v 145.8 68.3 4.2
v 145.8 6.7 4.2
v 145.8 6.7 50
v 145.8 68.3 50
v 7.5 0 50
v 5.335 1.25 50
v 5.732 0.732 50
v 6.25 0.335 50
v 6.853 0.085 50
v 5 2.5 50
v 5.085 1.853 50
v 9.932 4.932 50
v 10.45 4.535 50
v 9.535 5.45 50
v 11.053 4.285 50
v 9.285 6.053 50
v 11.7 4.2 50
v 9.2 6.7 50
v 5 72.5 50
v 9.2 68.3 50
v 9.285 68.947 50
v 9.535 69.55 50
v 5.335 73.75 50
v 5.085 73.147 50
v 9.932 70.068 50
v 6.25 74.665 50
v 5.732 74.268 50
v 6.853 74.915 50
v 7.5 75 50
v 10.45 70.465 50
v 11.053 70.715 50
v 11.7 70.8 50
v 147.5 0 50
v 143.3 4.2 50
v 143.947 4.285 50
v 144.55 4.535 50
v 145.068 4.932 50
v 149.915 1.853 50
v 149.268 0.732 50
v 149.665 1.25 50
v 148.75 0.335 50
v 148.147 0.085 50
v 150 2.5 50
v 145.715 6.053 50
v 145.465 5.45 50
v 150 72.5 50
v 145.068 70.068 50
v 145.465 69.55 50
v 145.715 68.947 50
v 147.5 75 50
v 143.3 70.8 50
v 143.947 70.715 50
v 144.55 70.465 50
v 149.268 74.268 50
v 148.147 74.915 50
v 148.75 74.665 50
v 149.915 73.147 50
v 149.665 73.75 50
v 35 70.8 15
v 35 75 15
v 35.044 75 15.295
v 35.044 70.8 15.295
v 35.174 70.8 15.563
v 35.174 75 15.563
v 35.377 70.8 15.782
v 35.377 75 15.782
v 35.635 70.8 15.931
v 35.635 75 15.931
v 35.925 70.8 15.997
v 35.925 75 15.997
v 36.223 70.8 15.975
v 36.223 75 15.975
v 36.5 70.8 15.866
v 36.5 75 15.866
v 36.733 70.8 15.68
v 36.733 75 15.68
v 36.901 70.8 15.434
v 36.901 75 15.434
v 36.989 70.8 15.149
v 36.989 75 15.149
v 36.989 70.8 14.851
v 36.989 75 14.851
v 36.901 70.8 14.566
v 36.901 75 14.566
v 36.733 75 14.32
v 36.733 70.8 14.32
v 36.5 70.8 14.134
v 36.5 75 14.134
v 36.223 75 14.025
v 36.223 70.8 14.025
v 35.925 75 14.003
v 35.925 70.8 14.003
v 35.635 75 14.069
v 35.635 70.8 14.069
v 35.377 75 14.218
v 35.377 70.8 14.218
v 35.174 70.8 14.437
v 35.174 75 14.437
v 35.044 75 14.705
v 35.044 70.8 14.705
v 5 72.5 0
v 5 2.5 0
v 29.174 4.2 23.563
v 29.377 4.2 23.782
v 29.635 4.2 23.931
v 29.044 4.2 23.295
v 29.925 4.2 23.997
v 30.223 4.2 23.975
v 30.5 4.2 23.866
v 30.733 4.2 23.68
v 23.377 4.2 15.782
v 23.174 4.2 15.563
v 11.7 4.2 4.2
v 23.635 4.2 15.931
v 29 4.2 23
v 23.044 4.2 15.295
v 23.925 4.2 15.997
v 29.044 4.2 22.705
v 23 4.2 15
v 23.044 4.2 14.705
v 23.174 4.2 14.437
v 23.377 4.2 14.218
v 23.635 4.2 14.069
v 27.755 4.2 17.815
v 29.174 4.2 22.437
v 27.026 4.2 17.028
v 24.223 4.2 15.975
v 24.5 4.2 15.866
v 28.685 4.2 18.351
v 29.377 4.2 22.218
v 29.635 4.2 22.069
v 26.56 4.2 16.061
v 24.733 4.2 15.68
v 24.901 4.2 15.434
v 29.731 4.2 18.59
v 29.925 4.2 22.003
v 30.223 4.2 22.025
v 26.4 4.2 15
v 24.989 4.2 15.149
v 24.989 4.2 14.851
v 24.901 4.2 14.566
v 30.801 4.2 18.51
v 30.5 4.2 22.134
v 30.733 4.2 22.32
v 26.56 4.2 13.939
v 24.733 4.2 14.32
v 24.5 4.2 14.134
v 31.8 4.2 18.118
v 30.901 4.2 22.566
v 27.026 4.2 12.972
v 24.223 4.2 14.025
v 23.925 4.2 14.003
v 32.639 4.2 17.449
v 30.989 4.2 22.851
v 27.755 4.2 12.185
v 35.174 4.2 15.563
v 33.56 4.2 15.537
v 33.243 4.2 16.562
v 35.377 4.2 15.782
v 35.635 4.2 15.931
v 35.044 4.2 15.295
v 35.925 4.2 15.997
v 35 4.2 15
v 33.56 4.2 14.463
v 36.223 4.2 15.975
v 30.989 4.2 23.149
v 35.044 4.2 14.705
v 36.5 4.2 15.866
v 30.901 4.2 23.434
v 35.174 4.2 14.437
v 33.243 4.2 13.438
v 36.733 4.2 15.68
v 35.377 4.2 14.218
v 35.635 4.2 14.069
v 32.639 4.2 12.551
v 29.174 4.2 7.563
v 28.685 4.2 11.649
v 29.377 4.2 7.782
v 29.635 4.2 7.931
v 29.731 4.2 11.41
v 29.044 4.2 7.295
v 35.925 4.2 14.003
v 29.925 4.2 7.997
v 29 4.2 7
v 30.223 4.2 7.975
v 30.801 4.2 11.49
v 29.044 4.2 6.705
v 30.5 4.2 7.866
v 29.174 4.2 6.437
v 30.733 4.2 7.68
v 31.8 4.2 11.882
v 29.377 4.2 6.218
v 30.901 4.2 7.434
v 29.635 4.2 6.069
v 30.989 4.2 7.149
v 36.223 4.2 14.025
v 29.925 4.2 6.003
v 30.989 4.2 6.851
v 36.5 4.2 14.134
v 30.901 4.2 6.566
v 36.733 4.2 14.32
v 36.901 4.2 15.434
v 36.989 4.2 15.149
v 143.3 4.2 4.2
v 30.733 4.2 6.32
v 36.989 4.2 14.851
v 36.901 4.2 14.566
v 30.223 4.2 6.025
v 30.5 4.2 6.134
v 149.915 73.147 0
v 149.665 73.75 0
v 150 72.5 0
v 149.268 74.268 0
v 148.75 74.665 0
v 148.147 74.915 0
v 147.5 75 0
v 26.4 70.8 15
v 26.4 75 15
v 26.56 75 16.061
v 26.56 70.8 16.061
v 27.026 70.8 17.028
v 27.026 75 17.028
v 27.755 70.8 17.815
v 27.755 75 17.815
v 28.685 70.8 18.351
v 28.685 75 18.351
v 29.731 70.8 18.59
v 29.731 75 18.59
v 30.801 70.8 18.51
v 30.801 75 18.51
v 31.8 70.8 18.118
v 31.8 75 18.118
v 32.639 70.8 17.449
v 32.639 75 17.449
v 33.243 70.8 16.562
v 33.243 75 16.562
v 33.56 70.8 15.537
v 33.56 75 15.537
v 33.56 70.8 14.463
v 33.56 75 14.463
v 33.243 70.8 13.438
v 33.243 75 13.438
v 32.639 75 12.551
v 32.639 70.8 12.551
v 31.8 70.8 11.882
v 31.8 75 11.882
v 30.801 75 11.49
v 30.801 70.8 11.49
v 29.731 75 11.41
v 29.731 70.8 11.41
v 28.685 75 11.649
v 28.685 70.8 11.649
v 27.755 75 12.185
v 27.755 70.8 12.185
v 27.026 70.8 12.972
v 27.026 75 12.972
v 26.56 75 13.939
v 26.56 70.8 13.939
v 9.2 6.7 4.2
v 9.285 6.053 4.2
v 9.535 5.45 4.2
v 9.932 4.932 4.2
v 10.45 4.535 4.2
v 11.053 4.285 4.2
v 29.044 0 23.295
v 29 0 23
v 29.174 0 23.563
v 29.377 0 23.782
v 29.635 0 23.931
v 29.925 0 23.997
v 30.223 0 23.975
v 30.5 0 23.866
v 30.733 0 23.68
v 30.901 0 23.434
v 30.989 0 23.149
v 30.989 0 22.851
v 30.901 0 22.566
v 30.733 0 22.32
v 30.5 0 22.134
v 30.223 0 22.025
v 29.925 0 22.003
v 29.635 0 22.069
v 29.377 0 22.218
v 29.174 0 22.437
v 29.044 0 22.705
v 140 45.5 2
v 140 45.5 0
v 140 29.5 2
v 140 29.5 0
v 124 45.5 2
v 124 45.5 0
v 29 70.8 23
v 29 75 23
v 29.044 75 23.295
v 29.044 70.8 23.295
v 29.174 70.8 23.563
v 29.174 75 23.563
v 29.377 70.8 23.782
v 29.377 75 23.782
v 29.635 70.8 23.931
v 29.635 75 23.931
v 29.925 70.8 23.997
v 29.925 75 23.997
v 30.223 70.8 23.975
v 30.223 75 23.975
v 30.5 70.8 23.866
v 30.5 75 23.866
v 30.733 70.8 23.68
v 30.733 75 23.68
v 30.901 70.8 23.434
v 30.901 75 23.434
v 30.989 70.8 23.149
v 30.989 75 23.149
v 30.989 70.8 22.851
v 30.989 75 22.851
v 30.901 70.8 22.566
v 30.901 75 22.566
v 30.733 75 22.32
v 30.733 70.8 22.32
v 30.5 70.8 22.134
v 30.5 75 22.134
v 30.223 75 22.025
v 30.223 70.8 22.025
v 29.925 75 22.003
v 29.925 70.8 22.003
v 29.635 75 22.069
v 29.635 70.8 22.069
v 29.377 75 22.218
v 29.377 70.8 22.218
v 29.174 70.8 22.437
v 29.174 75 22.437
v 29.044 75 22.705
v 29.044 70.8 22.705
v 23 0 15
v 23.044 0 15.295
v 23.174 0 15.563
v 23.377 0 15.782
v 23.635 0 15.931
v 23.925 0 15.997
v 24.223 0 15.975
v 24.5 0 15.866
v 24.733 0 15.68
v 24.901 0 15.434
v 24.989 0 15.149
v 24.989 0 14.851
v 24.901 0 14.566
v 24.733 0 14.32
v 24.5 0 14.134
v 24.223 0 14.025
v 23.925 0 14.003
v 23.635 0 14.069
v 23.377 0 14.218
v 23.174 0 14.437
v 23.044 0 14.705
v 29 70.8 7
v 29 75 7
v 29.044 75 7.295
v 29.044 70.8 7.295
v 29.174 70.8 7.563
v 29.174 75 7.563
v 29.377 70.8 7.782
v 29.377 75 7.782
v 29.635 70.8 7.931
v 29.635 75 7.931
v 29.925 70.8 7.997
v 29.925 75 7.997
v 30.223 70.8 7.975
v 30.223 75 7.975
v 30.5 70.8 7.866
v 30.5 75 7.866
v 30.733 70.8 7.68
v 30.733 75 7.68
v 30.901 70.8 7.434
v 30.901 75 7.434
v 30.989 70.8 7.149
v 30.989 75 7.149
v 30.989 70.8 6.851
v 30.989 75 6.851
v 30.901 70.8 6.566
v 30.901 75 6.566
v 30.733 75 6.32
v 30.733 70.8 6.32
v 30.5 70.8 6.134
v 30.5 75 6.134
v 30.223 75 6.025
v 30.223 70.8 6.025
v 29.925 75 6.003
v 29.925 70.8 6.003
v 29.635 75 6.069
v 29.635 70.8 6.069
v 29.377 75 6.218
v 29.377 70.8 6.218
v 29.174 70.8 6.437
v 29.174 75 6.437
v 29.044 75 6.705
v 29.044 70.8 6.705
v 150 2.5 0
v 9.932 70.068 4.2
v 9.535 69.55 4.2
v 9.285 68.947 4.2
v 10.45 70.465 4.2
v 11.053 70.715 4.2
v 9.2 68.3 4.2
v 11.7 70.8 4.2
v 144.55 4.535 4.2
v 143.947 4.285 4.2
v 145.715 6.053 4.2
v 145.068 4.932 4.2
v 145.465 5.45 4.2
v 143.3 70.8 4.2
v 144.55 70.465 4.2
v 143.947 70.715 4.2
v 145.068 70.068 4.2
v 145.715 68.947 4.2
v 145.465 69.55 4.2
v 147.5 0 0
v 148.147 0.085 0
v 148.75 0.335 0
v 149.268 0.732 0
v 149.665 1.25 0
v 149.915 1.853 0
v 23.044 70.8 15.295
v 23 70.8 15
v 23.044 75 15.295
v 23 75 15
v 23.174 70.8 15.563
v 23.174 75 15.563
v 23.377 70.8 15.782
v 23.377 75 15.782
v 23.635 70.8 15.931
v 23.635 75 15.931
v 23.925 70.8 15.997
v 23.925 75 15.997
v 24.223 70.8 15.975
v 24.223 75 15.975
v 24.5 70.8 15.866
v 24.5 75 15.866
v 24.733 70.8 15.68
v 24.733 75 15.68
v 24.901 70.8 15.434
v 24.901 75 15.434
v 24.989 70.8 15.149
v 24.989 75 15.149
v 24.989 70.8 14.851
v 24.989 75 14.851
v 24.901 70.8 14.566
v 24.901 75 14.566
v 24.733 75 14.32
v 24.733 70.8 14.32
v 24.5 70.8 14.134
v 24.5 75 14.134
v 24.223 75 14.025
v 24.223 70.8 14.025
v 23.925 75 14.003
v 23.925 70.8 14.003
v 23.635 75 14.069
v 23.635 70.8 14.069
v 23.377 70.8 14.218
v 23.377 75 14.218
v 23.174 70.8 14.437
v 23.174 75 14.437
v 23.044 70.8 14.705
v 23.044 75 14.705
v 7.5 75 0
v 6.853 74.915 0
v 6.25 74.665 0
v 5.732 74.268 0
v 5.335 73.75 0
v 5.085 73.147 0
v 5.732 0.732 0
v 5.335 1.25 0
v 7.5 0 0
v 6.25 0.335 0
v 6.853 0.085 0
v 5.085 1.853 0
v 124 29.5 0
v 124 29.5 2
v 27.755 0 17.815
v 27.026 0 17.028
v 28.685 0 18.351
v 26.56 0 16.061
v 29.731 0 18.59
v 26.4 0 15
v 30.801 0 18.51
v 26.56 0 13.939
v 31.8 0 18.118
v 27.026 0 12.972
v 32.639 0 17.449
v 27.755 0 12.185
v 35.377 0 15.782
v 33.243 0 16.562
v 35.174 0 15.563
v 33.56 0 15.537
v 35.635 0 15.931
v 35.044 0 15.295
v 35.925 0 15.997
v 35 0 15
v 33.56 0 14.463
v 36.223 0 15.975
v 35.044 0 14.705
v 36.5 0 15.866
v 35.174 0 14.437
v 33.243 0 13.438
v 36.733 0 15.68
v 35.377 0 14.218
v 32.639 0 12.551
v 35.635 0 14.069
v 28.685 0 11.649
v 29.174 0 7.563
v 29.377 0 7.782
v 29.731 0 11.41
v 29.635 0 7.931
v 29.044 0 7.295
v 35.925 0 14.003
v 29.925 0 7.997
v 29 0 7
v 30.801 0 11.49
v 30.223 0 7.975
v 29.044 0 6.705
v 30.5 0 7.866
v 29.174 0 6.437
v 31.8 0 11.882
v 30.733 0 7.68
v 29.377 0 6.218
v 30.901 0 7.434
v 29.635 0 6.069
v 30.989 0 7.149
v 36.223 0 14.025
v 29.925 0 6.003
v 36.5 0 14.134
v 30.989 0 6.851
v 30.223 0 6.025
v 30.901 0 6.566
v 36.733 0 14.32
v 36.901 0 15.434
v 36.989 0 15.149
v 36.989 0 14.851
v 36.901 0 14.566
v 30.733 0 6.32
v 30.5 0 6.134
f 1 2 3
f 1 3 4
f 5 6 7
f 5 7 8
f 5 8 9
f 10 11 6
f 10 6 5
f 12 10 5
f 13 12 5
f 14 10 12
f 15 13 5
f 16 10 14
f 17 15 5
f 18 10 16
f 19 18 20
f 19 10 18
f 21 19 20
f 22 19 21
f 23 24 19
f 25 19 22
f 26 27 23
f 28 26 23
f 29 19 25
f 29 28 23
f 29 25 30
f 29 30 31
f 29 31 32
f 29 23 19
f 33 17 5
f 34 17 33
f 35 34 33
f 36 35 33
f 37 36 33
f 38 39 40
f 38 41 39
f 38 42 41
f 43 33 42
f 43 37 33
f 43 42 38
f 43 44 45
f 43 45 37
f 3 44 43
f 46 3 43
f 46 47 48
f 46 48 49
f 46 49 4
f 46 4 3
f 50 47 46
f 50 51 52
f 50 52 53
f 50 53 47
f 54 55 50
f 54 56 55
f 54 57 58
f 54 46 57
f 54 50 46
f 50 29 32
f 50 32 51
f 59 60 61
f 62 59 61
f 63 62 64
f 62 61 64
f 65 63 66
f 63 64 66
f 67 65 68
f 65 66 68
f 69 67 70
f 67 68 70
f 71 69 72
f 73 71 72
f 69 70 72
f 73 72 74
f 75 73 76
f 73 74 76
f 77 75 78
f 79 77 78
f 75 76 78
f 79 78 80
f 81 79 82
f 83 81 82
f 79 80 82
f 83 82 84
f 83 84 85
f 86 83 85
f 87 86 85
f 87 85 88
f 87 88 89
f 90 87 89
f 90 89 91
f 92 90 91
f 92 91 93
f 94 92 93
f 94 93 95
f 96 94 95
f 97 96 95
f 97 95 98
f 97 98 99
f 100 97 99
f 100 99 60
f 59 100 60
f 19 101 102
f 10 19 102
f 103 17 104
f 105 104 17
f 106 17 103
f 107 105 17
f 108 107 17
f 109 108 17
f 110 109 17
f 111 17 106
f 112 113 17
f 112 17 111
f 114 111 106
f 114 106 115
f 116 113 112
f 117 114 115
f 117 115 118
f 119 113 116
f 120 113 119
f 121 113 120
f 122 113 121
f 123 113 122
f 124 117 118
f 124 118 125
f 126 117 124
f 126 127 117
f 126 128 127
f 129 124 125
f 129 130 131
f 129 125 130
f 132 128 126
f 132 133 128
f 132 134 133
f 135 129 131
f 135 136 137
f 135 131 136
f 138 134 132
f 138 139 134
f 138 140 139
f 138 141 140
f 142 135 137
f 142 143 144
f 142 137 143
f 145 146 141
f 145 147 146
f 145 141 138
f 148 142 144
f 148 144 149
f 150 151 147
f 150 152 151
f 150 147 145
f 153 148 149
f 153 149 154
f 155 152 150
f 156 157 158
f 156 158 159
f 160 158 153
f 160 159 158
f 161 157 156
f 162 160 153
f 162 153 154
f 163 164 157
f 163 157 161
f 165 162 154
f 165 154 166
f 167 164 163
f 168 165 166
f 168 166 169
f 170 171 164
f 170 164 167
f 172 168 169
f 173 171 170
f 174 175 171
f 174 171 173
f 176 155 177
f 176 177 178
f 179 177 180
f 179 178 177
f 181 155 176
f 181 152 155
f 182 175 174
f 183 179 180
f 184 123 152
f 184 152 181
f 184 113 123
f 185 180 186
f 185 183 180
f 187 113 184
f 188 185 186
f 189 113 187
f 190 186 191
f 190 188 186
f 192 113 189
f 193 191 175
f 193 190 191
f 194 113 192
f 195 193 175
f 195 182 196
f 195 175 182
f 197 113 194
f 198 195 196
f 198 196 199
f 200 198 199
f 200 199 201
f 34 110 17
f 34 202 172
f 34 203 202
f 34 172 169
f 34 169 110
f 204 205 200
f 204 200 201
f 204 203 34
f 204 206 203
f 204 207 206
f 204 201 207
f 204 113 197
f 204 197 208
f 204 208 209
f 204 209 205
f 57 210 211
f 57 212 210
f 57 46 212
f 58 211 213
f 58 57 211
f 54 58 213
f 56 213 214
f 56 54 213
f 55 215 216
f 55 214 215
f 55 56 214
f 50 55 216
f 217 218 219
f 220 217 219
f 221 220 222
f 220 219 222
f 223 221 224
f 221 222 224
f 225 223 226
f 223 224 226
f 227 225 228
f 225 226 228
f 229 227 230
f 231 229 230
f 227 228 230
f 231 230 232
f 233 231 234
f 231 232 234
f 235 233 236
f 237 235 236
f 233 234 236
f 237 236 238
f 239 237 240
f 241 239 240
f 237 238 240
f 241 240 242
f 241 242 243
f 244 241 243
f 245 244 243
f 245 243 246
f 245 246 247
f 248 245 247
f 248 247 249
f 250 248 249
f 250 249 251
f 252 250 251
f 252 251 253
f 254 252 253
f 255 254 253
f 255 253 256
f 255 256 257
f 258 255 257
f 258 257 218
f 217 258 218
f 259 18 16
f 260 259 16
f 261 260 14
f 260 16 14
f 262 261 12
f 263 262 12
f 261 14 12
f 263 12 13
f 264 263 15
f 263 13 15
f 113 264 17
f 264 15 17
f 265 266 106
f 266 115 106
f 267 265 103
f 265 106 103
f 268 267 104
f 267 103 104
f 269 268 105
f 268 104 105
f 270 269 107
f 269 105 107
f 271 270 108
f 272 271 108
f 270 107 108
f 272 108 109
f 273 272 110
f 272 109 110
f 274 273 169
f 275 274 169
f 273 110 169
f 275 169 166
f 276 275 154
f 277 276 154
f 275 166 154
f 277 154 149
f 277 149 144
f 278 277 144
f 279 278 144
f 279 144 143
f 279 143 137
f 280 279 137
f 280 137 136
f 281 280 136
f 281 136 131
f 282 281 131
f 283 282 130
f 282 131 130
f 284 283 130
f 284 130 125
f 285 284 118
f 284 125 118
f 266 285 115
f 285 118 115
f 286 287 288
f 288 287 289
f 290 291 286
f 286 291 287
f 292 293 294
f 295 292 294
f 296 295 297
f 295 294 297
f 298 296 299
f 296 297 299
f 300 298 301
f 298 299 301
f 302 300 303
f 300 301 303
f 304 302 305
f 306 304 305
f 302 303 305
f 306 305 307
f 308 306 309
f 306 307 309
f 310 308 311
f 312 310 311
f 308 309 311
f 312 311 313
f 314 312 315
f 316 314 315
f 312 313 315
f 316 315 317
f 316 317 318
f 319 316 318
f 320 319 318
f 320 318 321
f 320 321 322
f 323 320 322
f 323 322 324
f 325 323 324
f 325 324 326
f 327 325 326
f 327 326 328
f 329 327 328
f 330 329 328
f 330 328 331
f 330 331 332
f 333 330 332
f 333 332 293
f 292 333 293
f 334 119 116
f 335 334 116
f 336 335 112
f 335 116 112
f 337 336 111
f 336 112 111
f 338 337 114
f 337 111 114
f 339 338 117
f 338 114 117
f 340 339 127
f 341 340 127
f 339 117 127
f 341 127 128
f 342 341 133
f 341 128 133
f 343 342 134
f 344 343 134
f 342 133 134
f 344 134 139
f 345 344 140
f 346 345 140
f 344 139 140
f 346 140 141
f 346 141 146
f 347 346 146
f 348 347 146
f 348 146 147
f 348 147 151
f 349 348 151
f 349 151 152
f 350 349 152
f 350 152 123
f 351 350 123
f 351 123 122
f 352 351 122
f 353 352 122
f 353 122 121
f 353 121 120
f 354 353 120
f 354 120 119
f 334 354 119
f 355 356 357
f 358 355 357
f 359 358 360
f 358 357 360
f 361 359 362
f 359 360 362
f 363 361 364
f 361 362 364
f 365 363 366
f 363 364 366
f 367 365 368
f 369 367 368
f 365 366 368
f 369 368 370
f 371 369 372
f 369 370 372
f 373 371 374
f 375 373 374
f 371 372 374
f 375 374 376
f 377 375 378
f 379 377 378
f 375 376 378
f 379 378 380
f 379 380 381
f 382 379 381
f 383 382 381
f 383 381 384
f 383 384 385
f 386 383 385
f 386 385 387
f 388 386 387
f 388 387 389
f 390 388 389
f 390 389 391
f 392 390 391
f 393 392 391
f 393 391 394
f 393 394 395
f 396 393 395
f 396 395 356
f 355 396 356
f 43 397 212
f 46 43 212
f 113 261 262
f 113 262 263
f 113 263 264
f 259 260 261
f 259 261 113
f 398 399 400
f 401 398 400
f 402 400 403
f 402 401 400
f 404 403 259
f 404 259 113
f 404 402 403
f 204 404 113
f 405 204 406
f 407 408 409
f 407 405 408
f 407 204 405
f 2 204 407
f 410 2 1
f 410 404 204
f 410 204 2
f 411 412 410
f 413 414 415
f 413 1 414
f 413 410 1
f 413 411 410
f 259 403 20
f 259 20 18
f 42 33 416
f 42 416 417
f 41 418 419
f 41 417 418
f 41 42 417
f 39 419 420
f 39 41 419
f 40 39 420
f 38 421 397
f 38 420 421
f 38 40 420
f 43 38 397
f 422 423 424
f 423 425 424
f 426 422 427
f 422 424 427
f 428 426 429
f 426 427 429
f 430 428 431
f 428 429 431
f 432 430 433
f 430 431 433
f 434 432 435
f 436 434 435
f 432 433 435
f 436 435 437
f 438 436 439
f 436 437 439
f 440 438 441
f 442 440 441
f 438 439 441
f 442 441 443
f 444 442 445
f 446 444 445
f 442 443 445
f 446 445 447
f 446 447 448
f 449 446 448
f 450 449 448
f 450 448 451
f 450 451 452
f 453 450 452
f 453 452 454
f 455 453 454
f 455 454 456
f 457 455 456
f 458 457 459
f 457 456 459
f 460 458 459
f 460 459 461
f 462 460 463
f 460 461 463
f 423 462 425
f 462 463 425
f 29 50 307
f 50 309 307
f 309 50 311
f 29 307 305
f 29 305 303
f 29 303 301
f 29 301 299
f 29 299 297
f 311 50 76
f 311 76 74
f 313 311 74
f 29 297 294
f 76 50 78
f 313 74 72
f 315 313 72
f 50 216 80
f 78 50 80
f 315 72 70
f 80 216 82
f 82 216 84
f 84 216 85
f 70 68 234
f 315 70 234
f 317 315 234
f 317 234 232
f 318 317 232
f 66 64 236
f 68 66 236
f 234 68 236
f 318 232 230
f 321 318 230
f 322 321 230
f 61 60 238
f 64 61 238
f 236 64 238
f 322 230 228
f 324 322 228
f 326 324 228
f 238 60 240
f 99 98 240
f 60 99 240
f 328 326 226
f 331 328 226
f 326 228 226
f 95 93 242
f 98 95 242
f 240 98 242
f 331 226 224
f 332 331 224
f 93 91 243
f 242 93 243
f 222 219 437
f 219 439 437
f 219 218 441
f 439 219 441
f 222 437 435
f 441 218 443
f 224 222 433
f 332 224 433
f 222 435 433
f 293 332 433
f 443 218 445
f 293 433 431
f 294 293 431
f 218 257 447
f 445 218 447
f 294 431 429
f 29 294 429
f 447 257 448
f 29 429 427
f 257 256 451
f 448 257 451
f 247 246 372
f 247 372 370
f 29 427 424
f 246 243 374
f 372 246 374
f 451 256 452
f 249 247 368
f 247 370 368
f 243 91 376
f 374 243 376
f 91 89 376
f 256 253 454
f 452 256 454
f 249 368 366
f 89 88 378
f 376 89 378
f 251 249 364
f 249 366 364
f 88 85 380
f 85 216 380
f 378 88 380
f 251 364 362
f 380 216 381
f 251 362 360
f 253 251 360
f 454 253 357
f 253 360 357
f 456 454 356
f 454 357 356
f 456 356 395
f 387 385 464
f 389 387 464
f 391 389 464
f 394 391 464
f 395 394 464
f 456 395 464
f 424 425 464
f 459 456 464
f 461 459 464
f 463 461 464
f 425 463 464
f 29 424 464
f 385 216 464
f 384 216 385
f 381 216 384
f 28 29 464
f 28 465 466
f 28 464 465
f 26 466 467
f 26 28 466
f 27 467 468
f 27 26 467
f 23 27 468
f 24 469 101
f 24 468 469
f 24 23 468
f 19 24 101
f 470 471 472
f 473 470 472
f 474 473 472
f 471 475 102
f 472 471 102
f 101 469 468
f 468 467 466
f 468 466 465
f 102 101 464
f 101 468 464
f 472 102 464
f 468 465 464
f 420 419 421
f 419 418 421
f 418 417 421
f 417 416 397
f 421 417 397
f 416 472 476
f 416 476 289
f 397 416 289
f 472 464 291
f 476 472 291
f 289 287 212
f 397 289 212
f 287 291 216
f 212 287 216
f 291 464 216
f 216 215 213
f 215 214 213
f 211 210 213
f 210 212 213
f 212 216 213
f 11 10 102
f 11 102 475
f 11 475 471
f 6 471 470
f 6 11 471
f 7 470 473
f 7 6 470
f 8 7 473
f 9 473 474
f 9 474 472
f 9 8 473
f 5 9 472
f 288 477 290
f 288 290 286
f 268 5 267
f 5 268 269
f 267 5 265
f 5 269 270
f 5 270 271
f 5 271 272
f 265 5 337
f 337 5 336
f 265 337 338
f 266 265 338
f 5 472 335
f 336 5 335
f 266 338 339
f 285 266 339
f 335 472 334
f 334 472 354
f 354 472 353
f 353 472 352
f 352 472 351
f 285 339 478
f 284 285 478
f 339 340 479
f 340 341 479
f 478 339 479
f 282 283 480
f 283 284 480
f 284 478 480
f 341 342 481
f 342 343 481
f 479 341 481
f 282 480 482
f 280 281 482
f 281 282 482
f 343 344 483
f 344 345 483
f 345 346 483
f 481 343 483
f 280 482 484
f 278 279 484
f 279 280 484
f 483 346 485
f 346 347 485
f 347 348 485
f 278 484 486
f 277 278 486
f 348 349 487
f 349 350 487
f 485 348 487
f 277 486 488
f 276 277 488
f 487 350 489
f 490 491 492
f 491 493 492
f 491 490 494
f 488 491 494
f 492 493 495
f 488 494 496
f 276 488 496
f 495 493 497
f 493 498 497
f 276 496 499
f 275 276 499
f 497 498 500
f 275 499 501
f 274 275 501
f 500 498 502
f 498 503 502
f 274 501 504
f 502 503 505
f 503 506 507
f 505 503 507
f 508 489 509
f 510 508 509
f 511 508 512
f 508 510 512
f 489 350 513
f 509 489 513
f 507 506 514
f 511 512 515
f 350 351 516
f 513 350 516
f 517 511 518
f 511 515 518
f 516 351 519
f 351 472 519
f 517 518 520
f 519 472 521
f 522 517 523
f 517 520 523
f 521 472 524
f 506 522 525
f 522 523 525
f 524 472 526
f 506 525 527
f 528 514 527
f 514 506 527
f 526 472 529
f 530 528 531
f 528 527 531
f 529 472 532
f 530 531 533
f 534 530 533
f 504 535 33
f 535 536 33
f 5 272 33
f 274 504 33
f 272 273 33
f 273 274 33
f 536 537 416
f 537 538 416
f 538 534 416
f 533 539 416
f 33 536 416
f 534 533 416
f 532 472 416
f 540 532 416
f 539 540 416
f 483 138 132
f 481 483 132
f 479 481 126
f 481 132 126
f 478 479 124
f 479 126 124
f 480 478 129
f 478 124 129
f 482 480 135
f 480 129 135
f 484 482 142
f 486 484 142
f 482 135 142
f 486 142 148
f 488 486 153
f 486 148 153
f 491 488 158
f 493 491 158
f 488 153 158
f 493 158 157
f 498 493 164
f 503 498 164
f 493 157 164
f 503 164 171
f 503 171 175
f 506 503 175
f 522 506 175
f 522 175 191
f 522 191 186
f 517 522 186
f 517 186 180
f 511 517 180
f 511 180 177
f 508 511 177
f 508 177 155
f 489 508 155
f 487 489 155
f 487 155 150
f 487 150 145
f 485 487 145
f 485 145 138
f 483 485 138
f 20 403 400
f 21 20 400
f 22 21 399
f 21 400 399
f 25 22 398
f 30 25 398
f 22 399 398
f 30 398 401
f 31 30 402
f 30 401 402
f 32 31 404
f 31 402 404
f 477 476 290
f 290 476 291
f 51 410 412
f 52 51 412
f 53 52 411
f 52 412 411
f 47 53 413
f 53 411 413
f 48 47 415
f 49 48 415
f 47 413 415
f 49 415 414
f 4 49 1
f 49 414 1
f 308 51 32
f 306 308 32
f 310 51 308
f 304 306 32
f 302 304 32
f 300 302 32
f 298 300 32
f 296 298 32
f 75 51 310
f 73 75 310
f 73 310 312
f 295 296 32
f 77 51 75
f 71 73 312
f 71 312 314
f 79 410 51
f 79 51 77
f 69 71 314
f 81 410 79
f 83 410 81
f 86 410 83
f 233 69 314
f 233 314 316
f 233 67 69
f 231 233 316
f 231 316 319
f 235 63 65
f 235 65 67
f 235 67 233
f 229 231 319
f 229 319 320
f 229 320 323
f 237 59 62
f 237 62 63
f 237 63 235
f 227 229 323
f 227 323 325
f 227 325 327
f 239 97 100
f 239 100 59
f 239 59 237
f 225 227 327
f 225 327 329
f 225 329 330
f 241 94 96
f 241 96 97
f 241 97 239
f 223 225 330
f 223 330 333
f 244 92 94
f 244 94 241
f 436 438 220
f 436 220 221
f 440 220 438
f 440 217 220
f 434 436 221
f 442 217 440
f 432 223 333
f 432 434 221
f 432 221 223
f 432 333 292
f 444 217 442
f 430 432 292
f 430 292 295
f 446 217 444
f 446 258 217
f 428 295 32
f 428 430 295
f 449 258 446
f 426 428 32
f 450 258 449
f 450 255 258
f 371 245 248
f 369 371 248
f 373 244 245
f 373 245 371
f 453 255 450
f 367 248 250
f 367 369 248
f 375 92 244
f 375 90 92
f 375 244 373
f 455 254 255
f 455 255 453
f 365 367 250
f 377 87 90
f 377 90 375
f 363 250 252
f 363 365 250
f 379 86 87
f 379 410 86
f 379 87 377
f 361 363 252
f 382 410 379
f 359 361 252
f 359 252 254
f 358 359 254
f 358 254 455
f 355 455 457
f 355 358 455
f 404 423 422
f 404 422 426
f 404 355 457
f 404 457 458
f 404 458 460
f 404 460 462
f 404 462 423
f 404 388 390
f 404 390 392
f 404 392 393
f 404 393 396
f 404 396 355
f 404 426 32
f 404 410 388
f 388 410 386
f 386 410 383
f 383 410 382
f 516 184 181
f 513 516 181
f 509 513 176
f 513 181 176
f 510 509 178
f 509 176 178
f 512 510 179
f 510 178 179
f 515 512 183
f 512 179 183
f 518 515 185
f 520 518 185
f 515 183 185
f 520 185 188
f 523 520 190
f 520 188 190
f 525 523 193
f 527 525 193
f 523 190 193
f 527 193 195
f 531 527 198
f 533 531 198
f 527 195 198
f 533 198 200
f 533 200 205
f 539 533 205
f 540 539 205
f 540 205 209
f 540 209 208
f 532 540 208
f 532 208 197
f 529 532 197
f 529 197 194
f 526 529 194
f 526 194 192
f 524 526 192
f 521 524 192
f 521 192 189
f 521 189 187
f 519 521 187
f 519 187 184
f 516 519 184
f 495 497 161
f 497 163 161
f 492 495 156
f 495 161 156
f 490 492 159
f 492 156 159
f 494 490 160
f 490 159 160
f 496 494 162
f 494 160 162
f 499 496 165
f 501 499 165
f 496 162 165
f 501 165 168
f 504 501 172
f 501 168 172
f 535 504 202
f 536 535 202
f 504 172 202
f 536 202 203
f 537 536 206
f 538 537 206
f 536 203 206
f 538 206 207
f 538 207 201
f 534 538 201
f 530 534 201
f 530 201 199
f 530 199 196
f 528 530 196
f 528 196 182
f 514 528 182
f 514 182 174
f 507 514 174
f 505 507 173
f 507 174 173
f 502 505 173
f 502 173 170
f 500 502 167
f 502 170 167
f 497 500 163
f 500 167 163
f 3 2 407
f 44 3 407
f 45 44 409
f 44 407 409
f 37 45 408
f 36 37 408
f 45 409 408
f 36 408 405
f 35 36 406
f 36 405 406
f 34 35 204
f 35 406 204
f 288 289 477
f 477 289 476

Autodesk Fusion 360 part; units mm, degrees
sketch "Skizze1" plane through (0, 0, 0) normal (0, 0, 1) x (1, 0, 0)
  line L0 (5, 0) -> (150, 0)
  line L1 (150, 0) -> (150, 75)
  line L2 (150, 75) -> (5, 75)
  line L3 (5, 75) -> (5, 0)
extrude "Extrusion1" add sketch "Skizze1" along normal blind 50
shell "Schale1" thickness 4.2 removed faces 1 at (53.3333, 50, 50)
fillet "Abrundung1" radius 2.5 1 edges at (5, 0, 25)
fillet "Abrundung2" radius 2.5 1 edges at (9.2, 4.2, 27.1)
fillet "Abrundung3" radius 2.5 1 edges at (9.2, 70.8, 27.1)
fillet "Abrundung4" radius 2.5 1 edges at (5, 75, 25)
fillet "Abrundung5" radius 2.5 1 edges at (150, 75, 25)
fillet "Abrundung6" radius 2.5 1 edges at (145.8, 70.8, 27.1)
fillet "Abrundung7" radius 2.5 1 edges at (145.8, 4.2, 27.1)
fillet "Abrundung8" radius 2.5 1 edges at (150, 0, 25)
sketch "Skizze2" plane through (0, 75, 0) normal (0, 1, 0) x (-1, 0, 0)
  line L0 (-147.5, 50) -> (-147.5, 0)
  line L1 (-147.5, 0) -> (-7.5, 0)
  line L2 (-7.5, 0) -> (-7.5, 50)
  line L3 (-7.5, 50) -> (-147.5, 50)
  circle A0 centre (-30, 7) radius 1
  dimension "d20" = 2
extrude "Extrusion2" cut sketch "Skizze2" against normal blind 300 contours A0
sketch "Skizze3" plane through (0, 75, 0) normal (0, 1, 0) x (-1, 0, 0)
  circle A0 centre (-30, 7) radius 1
  line L0 (-147.5, 50) -> (-147.5, 0)
  line L1 (-147.5, 0) -> (-7.5, 0)
  line L2 (-7.5, 0) -> (-7.5, 50)
  line L3 (-7.5, 50) -> (-147.5, 50)
  circle A1 centre (-30, 23) radius 1
  dimension "d23" = 2
extrude "Extrusion3" cut sketch "Skizze3" against normal blind 300 contours A1
sketch "Skizze4" plane through (0, 75, 0) normal (0, 1, 0) x (-1, 0, 0)
  circle A0 centre (-30, 23) radius 1
  circle A1 centre (-30, 7) radius 1
  line L0 (-147.5, 50) -> (-147.5, 0)
  line L1 (-147.5, 0) -> (-7.5, 0)
  line L2 (-7.5, 0) -> (-7.5, 50)
  line L3 (-7.5, 50) -> (-147.5, 50)
  circle A2 centre (-24, 15) radius 1
  circle A3 centre (-36, 15) radius 1
  dimension "d26" = 2
  dimension "d27" = 2
extrude "Extrusion4" cut sketch "Skizze4" against normal blind 300 contours A2
sketch "Skizze5" plane through (0, 75, 0) normal (0, 1, 0) x (-1, 0, 0)
  circle A0 centre (-24, 15) radius 1
  circle A1 centre (-30, 23) radius 1
  circle A2 centre (-30, 7) radius 1
  line L0 (-147.5, 50) -> (-147.5, 0)
  line L1 (-147.5, 0) -> (-7.5, 0)
  line L2 (-7.5, 0) -> (-7.5, 50)
  line L3 (-7.5, 50) -> (-147.5, 50)
  circle A3 centre (-36, 15) radius 1
  dimension "d30" = 2
extrude "Extrusion5" cut sketch "Skizze5" against normal blind 300 contours A3
sketch "Skizze6" plane through (0, 75, 0) normal (0, 1, 0) x (-1, 0, 0)
  circle A0 centre (-36, 15) radius 1
  circle A1 centre (-24, 15) radius 1
  circle A2 centre (-30, 23) radius 1
  circle A3 centre (-30, 7) radius 1
  line L0 (-147.5, 50) -> (-147.5, 0)
  line L1 (-147.5, 0) -> (-7.5, 0)
  line L2 (-7.5, 0) -> (-7.5, 50)
  line L3 (-7.5, 50) -> (-147.5, 50)
  circle A4 centre (-30, 15) radius 3.6
  dimension "d33" = 7.2
extrude "Extrusion6" cut sketch "Skizze6" against normal blind 300 contours A4
sketch "Skizze7" plane through (0, 0, 0) normal (0, 0, -1) x (1, 0, 0)
  arc A0 (150, -2.5) -> (147.5, 0) centre (147.5, -2.5) ccw
  line L0 (147.5, 0) -> (7.5, 0)
  arc A1 (7.5, 0) -> (5, -2.5) centre (7.5, -2.5) ccw
  line L1 (5, -2.5) -> (5, -72.5)
  arc A2 (5, -72.5) -> (7.5, -75) centre (7.5, -72.5) ccw
  line L2 (7.5, -75) -> (147.5, -75)
  arc A3 (147.5, -75) -> (150, -72.5) centre (147.5, -72.5) ccw
  line L3 (150, -72.5) -> (150, -2.5)
  line L4 (140, -29.5) -> (124, -29.5)
  line L5 (124, -29.5) -> (124, -45.5)
  line L6 (124, -45.5) -> (140, -45.5)
  line L7 (140, -45.5) -> (140, -29.5)
extrude "Extrusion7" cut sketch "Skizze7" against normal blind 2 contours L4 L5 L6 L7
